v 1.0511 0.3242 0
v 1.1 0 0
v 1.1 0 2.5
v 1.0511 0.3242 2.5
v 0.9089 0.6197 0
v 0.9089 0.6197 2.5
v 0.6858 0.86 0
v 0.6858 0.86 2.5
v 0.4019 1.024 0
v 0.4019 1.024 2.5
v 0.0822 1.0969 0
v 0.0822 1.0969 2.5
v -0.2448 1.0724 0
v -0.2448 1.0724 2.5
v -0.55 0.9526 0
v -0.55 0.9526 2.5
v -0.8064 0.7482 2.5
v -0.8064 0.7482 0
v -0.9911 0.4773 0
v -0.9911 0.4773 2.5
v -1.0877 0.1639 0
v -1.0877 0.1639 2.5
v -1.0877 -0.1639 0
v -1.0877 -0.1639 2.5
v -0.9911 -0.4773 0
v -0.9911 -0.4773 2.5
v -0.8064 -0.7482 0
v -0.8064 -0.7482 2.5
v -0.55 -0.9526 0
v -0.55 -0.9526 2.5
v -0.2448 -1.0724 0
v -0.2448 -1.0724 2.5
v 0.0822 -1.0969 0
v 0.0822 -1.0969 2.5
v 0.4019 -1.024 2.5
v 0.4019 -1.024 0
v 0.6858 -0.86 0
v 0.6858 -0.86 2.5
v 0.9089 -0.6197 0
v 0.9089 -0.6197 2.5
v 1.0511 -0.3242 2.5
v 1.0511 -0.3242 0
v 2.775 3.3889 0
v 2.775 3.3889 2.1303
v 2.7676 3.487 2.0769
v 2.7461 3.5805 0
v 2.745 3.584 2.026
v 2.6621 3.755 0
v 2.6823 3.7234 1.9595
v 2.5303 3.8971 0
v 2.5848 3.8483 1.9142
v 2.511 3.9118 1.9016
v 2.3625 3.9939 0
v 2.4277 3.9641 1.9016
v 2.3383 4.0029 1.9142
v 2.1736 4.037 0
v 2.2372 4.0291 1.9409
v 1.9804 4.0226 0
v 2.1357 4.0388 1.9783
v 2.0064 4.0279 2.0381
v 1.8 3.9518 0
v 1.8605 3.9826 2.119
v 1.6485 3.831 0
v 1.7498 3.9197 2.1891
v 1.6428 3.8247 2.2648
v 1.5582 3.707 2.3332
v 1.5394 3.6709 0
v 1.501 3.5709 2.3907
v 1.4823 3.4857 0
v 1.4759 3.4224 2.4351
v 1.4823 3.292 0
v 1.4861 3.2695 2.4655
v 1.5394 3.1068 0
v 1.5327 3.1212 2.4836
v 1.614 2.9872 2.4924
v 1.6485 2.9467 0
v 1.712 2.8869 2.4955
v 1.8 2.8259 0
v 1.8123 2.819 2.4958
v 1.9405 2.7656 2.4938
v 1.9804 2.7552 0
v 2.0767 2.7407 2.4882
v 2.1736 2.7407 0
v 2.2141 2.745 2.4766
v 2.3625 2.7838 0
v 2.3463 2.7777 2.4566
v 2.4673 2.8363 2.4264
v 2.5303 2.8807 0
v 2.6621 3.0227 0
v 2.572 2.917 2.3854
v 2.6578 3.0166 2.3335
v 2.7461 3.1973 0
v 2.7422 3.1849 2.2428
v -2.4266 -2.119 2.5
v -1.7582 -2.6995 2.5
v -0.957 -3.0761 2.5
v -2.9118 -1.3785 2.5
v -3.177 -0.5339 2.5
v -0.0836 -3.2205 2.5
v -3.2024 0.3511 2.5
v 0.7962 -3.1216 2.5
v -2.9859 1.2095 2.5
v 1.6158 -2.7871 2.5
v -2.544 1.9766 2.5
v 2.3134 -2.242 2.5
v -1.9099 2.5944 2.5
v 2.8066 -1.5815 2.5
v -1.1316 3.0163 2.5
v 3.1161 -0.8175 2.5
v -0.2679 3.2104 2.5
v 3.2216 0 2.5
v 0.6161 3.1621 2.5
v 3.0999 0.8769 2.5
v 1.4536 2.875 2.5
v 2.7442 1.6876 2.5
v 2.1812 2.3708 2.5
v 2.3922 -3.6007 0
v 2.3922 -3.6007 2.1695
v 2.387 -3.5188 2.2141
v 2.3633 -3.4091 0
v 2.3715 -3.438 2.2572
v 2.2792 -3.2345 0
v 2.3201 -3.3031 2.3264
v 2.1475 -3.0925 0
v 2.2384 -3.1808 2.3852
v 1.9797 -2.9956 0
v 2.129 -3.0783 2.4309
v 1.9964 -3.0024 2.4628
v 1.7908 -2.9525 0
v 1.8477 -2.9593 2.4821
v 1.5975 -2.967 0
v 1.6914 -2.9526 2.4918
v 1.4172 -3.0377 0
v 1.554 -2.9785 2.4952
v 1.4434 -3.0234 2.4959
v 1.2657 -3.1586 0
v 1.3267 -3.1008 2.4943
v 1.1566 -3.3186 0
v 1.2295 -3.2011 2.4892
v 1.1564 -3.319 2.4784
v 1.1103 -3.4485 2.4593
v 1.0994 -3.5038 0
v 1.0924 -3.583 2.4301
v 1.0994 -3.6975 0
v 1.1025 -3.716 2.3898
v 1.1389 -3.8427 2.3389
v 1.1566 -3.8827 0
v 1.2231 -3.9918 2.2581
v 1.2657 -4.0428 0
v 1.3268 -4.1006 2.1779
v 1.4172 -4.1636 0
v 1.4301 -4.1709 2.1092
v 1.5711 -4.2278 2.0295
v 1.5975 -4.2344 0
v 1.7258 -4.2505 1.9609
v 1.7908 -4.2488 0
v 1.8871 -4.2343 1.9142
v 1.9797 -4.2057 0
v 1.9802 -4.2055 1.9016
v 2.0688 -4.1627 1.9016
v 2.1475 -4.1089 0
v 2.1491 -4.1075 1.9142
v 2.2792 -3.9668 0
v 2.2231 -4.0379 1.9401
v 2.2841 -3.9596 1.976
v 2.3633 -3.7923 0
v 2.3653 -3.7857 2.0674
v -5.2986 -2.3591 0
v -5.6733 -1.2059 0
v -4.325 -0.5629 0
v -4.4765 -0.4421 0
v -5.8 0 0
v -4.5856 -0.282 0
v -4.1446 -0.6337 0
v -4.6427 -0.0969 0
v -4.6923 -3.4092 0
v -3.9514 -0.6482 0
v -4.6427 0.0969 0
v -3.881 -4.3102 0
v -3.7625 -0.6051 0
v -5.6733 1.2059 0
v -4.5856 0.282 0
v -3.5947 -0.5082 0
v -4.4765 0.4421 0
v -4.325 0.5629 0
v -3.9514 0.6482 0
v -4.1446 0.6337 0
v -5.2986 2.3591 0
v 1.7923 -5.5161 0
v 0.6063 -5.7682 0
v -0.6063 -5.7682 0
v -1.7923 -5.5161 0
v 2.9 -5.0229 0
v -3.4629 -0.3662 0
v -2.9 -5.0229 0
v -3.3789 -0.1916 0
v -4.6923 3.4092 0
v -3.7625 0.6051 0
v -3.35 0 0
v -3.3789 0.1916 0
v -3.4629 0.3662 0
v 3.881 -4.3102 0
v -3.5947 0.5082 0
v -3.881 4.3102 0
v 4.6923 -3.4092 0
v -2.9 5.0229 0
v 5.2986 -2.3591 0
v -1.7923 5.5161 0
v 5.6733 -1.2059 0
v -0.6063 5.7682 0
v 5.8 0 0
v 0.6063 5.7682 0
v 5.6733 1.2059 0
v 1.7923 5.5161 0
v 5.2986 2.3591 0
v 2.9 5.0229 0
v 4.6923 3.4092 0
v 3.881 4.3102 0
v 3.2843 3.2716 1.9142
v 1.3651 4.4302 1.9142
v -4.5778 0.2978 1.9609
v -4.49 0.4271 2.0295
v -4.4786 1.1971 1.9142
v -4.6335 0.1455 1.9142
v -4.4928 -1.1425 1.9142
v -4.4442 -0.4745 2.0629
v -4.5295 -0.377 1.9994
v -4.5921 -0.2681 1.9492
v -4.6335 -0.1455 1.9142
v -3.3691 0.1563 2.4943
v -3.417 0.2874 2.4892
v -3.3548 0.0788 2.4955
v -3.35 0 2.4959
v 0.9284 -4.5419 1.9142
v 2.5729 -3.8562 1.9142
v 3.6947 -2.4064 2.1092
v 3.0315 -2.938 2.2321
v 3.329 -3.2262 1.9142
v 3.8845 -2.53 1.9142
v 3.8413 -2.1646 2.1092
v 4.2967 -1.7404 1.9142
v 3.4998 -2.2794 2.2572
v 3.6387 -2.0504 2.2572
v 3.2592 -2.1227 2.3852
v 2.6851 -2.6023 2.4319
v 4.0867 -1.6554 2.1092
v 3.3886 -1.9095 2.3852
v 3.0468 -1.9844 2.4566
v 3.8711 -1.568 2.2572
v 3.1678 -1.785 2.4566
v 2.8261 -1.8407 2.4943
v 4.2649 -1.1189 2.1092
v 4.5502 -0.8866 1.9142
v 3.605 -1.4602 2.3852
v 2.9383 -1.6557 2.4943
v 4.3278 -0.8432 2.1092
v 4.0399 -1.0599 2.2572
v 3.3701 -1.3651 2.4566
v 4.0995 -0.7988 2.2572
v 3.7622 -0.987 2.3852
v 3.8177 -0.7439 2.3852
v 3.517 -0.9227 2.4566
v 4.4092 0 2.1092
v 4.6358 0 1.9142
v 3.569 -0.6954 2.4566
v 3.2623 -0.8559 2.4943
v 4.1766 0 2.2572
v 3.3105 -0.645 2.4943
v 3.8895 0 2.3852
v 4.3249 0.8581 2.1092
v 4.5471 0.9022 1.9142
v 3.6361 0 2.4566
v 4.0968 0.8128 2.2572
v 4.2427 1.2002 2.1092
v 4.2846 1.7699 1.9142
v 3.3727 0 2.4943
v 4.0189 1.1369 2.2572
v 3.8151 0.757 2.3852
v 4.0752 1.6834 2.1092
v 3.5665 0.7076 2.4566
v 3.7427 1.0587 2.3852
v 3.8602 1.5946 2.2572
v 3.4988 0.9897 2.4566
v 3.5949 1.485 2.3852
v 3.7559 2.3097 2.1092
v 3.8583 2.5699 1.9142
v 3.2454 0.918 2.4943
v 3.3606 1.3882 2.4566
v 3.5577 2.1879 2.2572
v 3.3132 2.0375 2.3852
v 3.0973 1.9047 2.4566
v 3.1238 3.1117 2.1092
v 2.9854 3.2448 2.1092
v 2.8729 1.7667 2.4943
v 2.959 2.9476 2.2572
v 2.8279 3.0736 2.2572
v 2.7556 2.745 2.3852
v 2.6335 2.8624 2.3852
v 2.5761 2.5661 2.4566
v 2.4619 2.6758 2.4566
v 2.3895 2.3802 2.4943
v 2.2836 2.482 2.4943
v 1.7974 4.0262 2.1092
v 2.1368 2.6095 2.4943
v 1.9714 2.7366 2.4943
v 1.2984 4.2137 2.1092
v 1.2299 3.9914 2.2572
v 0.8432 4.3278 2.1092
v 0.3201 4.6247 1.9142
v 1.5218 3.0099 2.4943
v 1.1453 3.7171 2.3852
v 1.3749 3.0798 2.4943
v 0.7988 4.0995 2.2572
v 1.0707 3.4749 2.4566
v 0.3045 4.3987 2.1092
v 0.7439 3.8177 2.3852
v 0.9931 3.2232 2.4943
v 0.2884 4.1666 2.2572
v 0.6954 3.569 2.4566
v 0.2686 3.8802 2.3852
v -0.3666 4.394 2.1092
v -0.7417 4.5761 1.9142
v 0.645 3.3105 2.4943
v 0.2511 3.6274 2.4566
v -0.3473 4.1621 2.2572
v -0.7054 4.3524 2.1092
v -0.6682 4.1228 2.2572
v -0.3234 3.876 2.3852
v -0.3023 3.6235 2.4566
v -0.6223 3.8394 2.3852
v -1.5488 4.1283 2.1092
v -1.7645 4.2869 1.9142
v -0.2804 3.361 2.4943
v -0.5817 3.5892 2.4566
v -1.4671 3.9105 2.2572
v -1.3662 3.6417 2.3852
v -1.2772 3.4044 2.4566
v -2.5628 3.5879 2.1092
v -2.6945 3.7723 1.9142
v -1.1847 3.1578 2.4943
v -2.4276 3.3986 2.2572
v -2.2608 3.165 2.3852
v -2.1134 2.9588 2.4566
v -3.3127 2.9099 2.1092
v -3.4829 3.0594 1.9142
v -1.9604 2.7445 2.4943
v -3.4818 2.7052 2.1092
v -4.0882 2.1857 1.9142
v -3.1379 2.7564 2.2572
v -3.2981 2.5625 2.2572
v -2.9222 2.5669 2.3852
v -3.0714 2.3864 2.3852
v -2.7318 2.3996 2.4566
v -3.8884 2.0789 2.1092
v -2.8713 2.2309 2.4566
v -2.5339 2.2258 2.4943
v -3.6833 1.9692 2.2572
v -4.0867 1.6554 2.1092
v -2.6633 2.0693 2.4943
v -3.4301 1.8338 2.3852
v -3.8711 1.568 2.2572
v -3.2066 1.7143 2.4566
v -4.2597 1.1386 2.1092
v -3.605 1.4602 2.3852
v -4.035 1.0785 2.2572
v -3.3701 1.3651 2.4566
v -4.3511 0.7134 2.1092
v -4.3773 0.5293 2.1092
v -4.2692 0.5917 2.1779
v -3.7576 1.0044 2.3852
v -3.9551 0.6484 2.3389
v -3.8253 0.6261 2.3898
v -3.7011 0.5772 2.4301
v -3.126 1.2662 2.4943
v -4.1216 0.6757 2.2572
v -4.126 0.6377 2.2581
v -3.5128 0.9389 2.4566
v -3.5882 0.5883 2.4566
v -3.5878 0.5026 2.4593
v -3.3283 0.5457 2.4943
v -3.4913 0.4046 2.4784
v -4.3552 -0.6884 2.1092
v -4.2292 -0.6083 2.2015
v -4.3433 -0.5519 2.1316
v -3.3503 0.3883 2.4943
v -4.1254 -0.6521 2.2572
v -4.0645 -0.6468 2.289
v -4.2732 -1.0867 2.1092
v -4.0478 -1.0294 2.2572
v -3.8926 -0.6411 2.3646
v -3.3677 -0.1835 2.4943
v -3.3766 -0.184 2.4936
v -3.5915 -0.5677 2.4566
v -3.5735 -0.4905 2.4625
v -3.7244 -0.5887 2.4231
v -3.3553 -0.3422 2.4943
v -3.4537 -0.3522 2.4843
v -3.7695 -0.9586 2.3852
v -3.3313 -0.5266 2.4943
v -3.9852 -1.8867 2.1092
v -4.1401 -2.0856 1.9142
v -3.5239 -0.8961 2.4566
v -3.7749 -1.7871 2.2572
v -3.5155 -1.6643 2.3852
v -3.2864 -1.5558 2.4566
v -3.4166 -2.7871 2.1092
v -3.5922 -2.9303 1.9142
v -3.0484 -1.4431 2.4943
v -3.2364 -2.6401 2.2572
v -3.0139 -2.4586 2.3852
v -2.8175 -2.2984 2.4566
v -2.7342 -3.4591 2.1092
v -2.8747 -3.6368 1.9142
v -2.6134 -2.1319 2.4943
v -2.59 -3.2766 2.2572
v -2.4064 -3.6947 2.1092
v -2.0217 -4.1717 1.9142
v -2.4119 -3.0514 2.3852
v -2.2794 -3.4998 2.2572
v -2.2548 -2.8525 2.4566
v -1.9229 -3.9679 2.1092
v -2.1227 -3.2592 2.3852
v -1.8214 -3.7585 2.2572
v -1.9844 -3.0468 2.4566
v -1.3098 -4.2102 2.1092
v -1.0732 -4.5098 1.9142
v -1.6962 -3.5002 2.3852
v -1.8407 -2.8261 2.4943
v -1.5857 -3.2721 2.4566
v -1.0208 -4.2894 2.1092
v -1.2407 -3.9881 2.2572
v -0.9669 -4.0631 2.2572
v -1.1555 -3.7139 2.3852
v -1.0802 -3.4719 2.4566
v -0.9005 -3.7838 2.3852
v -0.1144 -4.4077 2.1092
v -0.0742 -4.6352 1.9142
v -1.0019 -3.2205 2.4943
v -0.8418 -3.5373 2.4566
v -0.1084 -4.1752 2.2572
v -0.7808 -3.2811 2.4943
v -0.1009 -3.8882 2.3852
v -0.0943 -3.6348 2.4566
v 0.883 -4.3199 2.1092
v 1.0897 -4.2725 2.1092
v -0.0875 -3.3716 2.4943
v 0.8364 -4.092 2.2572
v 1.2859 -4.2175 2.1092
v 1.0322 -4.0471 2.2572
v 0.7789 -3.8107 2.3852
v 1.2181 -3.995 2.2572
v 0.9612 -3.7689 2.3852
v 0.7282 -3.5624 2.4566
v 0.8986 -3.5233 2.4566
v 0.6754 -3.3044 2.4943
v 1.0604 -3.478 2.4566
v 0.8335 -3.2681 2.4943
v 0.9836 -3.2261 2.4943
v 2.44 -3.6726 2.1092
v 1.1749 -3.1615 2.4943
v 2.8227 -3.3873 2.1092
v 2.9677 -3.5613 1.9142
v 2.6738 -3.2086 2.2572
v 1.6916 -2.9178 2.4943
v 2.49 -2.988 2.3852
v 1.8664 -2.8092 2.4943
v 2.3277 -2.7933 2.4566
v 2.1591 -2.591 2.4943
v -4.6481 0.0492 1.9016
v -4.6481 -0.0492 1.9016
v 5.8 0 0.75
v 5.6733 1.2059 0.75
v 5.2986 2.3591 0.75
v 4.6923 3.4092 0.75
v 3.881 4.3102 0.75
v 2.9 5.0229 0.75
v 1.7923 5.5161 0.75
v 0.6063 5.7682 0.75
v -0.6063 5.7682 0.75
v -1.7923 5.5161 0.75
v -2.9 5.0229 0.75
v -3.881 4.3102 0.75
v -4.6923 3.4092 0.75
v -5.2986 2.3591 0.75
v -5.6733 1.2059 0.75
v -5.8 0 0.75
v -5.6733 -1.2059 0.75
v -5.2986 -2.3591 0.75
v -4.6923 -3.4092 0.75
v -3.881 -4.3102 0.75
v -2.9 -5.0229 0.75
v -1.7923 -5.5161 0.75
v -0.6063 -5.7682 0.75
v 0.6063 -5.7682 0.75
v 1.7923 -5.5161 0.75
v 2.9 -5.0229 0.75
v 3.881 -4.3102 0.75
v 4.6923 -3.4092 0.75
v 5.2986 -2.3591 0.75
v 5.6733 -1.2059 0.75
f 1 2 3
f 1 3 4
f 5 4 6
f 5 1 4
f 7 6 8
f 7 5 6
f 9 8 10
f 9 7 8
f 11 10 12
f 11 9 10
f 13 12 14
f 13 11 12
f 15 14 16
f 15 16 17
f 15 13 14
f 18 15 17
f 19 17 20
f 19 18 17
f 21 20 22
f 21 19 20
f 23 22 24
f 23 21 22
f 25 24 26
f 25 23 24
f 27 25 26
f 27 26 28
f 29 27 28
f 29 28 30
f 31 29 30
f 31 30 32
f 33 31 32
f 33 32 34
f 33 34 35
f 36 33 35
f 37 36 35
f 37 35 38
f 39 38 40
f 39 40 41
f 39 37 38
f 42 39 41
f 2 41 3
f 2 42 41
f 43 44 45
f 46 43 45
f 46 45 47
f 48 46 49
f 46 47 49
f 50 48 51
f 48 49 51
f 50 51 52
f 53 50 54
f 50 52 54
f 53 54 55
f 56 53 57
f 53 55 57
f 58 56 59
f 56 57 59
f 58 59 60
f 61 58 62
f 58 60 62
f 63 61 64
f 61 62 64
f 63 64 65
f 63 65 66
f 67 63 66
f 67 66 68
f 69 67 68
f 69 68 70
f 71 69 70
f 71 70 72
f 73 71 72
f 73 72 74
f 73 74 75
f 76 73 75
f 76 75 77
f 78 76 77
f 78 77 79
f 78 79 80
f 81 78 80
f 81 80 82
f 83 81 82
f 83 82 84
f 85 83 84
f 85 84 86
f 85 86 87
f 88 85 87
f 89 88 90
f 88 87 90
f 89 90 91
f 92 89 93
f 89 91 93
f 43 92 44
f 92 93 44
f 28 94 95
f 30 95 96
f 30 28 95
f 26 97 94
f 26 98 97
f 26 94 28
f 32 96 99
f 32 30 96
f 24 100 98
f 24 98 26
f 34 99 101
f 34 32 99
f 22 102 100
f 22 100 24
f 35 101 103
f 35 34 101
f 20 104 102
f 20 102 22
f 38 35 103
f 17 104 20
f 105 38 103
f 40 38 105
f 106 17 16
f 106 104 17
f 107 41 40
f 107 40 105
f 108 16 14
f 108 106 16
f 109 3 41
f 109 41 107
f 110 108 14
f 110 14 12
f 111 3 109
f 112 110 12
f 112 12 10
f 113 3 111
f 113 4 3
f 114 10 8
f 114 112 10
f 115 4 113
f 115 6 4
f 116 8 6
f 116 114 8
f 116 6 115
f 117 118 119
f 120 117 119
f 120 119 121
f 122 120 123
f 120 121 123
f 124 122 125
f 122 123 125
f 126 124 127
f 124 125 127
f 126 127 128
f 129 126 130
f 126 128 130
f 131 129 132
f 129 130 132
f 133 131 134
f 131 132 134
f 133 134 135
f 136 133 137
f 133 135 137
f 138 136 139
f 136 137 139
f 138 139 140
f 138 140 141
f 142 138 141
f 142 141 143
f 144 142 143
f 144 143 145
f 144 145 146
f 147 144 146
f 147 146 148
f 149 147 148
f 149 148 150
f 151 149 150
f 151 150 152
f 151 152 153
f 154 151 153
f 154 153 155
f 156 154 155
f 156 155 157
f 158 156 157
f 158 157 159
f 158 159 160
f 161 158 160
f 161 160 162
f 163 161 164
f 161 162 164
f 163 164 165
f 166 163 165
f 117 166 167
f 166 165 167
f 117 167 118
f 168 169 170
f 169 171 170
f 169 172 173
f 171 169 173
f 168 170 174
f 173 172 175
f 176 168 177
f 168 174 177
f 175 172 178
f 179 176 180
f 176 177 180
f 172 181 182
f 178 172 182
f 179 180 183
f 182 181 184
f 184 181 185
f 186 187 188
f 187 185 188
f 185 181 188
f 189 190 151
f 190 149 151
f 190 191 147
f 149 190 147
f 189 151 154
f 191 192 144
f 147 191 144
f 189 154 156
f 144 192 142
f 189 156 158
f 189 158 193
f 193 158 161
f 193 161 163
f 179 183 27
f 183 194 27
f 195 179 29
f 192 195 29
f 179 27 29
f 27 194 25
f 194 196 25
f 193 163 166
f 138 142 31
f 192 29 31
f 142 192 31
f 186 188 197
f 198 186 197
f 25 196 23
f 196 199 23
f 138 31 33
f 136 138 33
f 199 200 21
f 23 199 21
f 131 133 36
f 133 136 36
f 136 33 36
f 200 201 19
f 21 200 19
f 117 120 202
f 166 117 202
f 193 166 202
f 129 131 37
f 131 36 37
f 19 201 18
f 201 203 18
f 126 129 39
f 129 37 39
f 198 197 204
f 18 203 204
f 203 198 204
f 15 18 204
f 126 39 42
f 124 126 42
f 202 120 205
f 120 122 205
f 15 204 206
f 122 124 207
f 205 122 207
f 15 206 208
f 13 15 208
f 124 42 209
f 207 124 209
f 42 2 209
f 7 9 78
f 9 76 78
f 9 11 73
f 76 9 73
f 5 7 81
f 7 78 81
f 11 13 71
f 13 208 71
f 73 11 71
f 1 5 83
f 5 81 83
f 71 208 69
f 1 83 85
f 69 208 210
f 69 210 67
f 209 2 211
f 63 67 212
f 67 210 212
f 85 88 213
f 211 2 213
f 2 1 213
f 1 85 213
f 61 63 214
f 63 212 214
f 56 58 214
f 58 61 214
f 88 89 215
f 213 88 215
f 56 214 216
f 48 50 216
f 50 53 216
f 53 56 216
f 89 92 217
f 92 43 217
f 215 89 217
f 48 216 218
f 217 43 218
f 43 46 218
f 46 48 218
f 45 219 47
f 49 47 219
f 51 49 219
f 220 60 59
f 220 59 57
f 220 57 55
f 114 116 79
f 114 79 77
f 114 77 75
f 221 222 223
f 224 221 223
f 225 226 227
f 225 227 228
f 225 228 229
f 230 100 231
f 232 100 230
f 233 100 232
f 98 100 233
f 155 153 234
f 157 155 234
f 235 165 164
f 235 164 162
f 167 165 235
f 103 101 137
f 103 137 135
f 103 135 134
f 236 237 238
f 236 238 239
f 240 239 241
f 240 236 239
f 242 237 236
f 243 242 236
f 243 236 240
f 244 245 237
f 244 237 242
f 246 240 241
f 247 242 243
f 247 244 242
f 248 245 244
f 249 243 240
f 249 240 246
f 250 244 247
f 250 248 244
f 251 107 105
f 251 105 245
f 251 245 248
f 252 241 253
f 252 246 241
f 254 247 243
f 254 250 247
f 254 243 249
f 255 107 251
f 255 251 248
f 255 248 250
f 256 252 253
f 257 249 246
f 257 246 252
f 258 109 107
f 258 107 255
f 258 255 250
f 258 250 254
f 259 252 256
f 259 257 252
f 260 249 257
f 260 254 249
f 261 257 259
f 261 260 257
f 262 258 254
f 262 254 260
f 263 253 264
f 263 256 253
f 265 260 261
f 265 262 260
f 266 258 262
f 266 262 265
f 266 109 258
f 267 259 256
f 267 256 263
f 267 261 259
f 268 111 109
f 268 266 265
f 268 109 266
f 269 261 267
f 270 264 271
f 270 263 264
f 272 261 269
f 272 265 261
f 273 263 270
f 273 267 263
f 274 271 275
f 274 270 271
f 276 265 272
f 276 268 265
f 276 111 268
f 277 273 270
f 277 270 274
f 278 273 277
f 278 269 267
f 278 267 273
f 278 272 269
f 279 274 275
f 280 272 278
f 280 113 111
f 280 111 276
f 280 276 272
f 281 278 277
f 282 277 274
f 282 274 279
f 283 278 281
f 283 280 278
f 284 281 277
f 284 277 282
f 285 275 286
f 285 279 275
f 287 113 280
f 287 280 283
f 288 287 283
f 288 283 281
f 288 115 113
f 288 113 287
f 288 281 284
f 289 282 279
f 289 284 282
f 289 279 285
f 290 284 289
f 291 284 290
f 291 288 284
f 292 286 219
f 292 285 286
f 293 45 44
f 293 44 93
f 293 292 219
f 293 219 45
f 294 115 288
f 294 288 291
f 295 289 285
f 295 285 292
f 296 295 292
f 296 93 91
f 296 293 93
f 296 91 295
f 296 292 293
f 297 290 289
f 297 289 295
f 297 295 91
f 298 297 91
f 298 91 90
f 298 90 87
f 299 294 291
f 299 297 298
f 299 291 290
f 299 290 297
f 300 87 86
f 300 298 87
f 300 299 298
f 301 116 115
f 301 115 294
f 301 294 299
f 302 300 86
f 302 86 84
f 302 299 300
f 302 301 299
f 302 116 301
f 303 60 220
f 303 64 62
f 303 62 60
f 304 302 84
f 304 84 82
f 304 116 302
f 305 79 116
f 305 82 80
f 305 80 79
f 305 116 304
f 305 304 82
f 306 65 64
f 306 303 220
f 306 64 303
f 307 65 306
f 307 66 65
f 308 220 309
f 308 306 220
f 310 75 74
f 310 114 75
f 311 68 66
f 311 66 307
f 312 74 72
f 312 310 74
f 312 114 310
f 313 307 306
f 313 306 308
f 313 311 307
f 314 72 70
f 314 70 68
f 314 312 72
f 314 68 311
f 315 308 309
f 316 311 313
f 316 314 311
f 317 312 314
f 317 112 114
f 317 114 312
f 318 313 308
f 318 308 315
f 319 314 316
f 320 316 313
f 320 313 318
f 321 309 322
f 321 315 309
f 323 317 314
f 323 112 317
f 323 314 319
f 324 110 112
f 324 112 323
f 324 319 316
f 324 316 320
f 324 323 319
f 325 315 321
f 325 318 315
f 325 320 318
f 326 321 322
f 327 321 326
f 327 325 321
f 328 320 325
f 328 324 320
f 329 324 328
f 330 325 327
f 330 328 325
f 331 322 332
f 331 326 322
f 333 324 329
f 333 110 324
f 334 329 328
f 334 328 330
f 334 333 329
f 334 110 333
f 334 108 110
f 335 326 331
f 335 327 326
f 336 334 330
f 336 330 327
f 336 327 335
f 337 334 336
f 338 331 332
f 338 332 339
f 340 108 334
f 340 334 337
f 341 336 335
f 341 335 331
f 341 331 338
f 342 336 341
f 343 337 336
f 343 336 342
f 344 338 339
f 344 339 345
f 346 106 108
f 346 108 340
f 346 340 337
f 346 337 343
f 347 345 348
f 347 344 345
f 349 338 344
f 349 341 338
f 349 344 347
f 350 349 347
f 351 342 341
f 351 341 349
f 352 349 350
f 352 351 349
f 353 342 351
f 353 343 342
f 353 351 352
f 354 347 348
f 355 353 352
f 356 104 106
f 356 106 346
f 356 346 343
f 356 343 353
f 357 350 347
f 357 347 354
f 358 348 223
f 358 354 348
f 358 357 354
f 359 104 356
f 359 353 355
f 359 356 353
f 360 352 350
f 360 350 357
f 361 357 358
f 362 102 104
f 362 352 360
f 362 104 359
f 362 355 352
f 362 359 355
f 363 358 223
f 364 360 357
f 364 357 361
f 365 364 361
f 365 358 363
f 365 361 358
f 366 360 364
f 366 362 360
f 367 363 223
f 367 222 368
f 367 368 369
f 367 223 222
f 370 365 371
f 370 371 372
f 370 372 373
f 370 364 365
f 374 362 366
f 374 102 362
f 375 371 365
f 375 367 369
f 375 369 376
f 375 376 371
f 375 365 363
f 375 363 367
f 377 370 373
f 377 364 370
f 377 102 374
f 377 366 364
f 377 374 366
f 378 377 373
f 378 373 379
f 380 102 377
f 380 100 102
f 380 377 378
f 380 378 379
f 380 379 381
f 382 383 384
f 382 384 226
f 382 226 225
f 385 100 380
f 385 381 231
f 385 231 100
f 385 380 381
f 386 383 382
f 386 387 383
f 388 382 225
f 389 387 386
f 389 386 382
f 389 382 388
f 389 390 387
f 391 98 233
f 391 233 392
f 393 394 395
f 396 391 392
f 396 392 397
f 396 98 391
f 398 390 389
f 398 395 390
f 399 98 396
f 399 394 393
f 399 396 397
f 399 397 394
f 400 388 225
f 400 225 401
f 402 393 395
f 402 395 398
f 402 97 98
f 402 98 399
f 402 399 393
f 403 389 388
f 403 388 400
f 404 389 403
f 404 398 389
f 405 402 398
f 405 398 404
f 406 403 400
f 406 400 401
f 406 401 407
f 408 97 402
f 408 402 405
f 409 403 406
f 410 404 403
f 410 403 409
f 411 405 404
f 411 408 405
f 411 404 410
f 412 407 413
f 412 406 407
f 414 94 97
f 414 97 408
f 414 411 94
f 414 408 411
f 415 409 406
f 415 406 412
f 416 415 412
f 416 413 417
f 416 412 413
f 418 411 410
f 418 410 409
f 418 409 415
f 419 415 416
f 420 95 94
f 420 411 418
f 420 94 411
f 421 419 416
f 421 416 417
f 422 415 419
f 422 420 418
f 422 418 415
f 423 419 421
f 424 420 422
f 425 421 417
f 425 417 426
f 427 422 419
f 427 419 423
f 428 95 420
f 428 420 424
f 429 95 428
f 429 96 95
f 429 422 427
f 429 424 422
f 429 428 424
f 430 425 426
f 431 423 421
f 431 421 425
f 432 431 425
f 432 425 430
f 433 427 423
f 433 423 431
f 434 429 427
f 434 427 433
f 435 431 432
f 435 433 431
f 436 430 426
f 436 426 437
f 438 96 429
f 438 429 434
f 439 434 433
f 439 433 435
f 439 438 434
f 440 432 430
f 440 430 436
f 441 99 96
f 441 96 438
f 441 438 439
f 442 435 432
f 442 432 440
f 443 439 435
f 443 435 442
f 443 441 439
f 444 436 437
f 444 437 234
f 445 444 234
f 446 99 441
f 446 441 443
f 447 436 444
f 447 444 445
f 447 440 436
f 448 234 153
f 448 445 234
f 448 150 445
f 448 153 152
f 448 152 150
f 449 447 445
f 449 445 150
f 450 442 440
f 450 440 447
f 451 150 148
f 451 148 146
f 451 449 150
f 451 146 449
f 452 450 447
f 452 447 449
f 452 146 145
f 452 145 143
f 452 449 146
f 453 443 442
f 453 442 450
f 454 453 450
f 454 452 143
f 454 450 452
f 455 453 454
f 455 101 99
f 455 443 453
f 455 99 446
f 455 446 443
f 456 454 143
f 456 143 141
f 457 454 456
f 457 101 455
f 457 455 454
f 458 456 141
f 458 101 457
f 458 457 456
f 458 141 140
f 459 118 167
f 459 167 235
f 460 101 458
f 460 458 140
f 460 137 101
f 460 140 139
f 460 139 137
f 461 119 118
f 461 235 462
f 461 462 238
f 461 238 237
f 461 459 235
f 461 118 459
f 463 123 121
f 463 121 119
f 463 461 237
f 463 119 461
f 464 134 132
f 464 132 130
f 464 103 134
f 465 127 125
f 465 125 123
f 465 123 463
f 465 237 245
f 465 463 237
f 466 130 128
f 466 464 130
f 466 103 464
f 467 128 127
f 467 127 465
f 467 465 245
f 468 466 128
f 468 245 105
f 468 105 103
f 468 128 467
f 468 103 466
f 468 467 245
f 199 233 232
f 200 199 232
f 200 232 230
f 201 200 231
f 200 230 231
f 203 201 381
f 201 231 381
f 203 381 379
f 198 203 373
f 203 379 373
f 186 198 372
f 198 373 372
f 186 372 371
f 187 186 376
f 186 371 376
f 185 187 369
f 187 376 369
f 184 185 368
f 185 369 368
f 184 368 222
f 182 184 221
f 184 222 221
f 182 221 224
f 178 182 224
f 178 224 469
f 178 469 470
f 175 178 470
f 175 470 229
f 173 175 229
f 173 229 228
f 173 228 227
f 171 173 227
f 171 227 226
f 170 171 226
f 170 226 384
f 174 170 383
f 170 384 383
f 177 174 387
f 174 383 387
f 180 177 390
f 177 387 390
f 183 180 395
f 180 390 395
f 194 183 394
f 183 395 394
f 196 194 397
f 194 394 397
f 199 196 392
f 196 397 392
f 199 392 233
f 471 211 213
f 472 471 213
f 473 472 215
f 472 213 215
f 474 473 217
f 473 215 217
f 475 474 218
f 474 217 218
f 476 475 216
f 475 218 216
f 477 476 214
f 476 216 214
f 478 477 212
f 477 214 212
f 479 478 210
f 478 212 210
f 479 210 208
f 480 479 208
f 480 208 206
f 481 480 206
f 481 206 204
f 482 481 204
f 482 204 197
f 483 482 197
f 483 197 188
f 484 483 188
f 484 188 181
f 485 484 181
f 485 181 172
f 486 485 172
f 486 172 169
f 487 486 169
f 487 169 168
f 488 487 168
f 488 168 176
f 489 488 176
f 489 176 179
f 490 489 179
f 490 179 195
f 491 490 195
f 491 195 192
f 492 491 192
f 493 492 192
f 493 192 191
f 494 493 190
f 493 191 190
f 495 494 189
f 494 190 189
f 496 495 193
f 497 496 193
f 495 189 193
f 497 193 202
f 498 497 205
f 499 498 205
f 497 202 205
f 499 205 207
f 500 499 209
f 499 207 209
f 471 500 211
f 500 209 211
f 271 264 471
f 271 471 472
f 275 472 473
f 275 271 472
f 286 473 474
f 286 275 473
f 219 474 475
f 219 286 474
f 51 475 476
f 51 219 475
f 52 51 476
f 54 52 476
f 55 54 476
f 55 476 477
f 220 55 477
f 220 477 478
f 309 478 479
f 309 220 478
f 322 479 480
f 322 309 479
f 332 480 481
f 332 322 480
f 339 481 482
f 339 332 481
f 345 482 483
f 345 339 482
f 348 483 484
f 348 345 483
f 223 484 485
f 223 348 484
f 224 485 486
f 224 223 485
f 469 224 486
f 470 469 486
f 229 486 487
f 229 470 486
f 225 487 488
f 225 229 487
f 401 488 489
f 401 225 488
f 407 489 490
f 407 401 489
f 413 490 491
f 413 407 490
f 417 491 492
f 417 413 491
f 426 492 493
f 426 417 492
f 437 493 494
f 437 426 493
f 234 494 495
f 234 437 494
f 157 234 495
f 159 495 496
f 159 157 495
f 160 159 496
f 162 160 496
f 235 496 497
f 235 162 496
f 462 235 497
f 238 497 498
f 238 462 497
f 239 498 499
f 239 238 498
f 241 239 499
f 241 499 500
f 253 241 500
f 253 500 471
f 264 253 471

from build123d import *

# Parameters (mm, degrees)
F0_R        = 5.8
F0_R_2      = 1.1
F1_DEPTH    = 2.5
F2_R        = 0.65
F3_DEPTH    = 25
F5_T2_ANGLE = 77.9776147156
F5_T4_ANGLE = 162.2494051266
F5_T6_ANGLE = 155.9758879551
F5_T8_ANGLE = 84.2484124222


# Not quite as in the source:
# - a fillet or chamfer that OpenCascade refuses, or shapes differently, is made with other operations: its cross-section is extruded or revolved along the edge and cut away or added


with BuildPart() as f1:
    # F0 (on Top) → F1 (new body)
    with BuildSketch(Plane.XY):
        Circle(F0_R)
        Circle(F0_R_2, mode=Mode.SUBTRACT)
    extrude(amount=F1_DEPTH)

    # F2 (on face) → F3 (cut)
    with BuildSketch(Plane.XY.offset(2.5)):
        with Locations((-4, 0)):
            Circle(F2_R)
        with Locations((2.125, 3.3888604279)):
            Circle(F2_R)
        with Locations((1.7421875, -3.6006642047)):
            Circle(F2_R)
    extrude(amount=-F3_DEPTH, mode=Mode.SUBTRACT)

    # F4: chamfer of 1.75 on 1 edges, made by hand

    # F4_s1 → F4_t2 (revolve, cut)
    with BuildSketch(Plane.XZ):
        Polygon((5.8, 0.75), (4.05, 2.5), (5.8, 2.5), align=None)
    revolve(axis=Axis((0, 0, 2.5), (0, 0, 1)), mode=Mode.SUBTRACT)

    # F5: fillet of radius 2 on 4 edges, made by hand

    # F5_s1 → F5_t2 (revolve, cut)
    with BuildSketch(Plane.XZ):
        with BuildLine():
            ThreePointArc((4.6357864376, 1.9142135624), (3.98693974, 2.347759065), (3.2215728753, 2.5))
            Line((3.2215728753, 2.5), (4.05, 2.5))
            Line((4.05, 2.5), (4.6357864376, 1.9142135624))
        make_face()
    revolve(axis=Axis((0, 0, 2.5), (0, 0, 1)), revolution_arc=F5_T2_ANGLE, mode=Mode.SUBTRACT)

    # F5_s3 → F5_t4 (revolve, cut)
    with BuildSketch(Plane(origin=(0, 0, 0), x_dir=(0, 0, 1), z_dir=(0.61332513, -0.7898305419, 0))):
        with BuildLine():
            ThreePointArc((1.9142135624, -4.6357864376), (2.347759065, -3.98693974), (2.5, -3.2215728753))
            Line((2.5, -3.2215728753), (2.5, -4.05))
            Line((2.5, -4.05), (1.9142135624, -4.6357864376))
        make_face()
    revolve(axis=Axis((0, 0, 2.5), (0, 0, 1)), revolution_arc=F5_T4_ANGLE, mode=Mode.SUBTRACT)

    # F5_s5 → F5_t6 (revolve, cut)
    with BuildSketch(Plane(origin=(0, 0, 0), x_dir=(0, 0, 1), z_dir=(0.3432973656, 0.9392267664, 0))):
        with BuildLine():
            ThreePointArc((1.9142135624, -4.6357864376), (2.347759065, -3.98693974), (2.5, -3.2215728753))
            Line((2.5, -3.2215728753), (2.5, -4.05))
            Line((2.5, -4.05), (1.9142135624, -4.6357864376))
        make_face()
    revolve(axis=Axis((0, 0, 2.5), (0, 0, 1)), revolution_arc=F5_T6_ANGLE, mode=Mode.SUBTRACT)

    # F5_s7 → F5_t8 (revolve, cut)
    with BuildSketch(Plane(origin=(0, 0, 0), x_dir=(0, 0, 1), z_dir=(-0.9949657418, -0.1002156306, 0))):
        with BuildLine():
            ThreePointArc((1.9142135624, -4.6357864376), (2.347759065, -3.98693974), (2.5, -3.2215728753))
            Line((2.5, -3.2215728753), (2.5, -4.05))
            Line((2.5, -4.05), (1.9142135624, -4.6357864376))
        make_face()
    revolve(axis=Axis((0, 0, 2.5), (0, 0, 1)), revolution_arc=F5_T8_ANGLE, mode=Mode.SUBTRACT)


solid = f1.part
